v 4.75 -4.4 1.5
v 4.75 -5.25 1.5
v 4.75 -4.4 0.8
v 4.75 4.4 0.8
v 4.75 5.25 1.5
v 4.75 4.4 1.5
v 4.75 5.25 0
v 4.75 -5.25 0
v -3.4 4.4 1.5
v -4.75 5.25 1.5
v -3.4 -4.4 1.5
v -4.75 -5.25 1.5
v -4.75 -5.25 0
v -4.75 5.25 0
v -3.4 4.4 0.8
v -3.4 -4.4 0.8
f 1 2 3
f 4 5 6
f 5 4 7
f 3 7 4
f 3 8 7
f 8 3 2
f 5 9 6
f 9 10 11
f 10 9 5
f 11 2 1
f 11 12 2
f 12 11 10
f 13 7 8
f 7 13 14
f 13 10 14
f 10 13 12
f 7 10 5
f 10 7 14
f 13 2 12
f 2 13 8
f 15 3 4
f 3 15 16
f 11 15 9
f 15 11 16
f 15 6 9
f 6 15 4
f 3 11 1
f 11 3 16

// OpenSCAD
// camshim
// a shim for the PiCam V2.1

difference(){
translate([0,0,0.75])    
cube([9.5,10.5,1.5],center=true);

translate([1,0,0.8+1.5])    
cube([8.8,8.8,3],center=true);

}
